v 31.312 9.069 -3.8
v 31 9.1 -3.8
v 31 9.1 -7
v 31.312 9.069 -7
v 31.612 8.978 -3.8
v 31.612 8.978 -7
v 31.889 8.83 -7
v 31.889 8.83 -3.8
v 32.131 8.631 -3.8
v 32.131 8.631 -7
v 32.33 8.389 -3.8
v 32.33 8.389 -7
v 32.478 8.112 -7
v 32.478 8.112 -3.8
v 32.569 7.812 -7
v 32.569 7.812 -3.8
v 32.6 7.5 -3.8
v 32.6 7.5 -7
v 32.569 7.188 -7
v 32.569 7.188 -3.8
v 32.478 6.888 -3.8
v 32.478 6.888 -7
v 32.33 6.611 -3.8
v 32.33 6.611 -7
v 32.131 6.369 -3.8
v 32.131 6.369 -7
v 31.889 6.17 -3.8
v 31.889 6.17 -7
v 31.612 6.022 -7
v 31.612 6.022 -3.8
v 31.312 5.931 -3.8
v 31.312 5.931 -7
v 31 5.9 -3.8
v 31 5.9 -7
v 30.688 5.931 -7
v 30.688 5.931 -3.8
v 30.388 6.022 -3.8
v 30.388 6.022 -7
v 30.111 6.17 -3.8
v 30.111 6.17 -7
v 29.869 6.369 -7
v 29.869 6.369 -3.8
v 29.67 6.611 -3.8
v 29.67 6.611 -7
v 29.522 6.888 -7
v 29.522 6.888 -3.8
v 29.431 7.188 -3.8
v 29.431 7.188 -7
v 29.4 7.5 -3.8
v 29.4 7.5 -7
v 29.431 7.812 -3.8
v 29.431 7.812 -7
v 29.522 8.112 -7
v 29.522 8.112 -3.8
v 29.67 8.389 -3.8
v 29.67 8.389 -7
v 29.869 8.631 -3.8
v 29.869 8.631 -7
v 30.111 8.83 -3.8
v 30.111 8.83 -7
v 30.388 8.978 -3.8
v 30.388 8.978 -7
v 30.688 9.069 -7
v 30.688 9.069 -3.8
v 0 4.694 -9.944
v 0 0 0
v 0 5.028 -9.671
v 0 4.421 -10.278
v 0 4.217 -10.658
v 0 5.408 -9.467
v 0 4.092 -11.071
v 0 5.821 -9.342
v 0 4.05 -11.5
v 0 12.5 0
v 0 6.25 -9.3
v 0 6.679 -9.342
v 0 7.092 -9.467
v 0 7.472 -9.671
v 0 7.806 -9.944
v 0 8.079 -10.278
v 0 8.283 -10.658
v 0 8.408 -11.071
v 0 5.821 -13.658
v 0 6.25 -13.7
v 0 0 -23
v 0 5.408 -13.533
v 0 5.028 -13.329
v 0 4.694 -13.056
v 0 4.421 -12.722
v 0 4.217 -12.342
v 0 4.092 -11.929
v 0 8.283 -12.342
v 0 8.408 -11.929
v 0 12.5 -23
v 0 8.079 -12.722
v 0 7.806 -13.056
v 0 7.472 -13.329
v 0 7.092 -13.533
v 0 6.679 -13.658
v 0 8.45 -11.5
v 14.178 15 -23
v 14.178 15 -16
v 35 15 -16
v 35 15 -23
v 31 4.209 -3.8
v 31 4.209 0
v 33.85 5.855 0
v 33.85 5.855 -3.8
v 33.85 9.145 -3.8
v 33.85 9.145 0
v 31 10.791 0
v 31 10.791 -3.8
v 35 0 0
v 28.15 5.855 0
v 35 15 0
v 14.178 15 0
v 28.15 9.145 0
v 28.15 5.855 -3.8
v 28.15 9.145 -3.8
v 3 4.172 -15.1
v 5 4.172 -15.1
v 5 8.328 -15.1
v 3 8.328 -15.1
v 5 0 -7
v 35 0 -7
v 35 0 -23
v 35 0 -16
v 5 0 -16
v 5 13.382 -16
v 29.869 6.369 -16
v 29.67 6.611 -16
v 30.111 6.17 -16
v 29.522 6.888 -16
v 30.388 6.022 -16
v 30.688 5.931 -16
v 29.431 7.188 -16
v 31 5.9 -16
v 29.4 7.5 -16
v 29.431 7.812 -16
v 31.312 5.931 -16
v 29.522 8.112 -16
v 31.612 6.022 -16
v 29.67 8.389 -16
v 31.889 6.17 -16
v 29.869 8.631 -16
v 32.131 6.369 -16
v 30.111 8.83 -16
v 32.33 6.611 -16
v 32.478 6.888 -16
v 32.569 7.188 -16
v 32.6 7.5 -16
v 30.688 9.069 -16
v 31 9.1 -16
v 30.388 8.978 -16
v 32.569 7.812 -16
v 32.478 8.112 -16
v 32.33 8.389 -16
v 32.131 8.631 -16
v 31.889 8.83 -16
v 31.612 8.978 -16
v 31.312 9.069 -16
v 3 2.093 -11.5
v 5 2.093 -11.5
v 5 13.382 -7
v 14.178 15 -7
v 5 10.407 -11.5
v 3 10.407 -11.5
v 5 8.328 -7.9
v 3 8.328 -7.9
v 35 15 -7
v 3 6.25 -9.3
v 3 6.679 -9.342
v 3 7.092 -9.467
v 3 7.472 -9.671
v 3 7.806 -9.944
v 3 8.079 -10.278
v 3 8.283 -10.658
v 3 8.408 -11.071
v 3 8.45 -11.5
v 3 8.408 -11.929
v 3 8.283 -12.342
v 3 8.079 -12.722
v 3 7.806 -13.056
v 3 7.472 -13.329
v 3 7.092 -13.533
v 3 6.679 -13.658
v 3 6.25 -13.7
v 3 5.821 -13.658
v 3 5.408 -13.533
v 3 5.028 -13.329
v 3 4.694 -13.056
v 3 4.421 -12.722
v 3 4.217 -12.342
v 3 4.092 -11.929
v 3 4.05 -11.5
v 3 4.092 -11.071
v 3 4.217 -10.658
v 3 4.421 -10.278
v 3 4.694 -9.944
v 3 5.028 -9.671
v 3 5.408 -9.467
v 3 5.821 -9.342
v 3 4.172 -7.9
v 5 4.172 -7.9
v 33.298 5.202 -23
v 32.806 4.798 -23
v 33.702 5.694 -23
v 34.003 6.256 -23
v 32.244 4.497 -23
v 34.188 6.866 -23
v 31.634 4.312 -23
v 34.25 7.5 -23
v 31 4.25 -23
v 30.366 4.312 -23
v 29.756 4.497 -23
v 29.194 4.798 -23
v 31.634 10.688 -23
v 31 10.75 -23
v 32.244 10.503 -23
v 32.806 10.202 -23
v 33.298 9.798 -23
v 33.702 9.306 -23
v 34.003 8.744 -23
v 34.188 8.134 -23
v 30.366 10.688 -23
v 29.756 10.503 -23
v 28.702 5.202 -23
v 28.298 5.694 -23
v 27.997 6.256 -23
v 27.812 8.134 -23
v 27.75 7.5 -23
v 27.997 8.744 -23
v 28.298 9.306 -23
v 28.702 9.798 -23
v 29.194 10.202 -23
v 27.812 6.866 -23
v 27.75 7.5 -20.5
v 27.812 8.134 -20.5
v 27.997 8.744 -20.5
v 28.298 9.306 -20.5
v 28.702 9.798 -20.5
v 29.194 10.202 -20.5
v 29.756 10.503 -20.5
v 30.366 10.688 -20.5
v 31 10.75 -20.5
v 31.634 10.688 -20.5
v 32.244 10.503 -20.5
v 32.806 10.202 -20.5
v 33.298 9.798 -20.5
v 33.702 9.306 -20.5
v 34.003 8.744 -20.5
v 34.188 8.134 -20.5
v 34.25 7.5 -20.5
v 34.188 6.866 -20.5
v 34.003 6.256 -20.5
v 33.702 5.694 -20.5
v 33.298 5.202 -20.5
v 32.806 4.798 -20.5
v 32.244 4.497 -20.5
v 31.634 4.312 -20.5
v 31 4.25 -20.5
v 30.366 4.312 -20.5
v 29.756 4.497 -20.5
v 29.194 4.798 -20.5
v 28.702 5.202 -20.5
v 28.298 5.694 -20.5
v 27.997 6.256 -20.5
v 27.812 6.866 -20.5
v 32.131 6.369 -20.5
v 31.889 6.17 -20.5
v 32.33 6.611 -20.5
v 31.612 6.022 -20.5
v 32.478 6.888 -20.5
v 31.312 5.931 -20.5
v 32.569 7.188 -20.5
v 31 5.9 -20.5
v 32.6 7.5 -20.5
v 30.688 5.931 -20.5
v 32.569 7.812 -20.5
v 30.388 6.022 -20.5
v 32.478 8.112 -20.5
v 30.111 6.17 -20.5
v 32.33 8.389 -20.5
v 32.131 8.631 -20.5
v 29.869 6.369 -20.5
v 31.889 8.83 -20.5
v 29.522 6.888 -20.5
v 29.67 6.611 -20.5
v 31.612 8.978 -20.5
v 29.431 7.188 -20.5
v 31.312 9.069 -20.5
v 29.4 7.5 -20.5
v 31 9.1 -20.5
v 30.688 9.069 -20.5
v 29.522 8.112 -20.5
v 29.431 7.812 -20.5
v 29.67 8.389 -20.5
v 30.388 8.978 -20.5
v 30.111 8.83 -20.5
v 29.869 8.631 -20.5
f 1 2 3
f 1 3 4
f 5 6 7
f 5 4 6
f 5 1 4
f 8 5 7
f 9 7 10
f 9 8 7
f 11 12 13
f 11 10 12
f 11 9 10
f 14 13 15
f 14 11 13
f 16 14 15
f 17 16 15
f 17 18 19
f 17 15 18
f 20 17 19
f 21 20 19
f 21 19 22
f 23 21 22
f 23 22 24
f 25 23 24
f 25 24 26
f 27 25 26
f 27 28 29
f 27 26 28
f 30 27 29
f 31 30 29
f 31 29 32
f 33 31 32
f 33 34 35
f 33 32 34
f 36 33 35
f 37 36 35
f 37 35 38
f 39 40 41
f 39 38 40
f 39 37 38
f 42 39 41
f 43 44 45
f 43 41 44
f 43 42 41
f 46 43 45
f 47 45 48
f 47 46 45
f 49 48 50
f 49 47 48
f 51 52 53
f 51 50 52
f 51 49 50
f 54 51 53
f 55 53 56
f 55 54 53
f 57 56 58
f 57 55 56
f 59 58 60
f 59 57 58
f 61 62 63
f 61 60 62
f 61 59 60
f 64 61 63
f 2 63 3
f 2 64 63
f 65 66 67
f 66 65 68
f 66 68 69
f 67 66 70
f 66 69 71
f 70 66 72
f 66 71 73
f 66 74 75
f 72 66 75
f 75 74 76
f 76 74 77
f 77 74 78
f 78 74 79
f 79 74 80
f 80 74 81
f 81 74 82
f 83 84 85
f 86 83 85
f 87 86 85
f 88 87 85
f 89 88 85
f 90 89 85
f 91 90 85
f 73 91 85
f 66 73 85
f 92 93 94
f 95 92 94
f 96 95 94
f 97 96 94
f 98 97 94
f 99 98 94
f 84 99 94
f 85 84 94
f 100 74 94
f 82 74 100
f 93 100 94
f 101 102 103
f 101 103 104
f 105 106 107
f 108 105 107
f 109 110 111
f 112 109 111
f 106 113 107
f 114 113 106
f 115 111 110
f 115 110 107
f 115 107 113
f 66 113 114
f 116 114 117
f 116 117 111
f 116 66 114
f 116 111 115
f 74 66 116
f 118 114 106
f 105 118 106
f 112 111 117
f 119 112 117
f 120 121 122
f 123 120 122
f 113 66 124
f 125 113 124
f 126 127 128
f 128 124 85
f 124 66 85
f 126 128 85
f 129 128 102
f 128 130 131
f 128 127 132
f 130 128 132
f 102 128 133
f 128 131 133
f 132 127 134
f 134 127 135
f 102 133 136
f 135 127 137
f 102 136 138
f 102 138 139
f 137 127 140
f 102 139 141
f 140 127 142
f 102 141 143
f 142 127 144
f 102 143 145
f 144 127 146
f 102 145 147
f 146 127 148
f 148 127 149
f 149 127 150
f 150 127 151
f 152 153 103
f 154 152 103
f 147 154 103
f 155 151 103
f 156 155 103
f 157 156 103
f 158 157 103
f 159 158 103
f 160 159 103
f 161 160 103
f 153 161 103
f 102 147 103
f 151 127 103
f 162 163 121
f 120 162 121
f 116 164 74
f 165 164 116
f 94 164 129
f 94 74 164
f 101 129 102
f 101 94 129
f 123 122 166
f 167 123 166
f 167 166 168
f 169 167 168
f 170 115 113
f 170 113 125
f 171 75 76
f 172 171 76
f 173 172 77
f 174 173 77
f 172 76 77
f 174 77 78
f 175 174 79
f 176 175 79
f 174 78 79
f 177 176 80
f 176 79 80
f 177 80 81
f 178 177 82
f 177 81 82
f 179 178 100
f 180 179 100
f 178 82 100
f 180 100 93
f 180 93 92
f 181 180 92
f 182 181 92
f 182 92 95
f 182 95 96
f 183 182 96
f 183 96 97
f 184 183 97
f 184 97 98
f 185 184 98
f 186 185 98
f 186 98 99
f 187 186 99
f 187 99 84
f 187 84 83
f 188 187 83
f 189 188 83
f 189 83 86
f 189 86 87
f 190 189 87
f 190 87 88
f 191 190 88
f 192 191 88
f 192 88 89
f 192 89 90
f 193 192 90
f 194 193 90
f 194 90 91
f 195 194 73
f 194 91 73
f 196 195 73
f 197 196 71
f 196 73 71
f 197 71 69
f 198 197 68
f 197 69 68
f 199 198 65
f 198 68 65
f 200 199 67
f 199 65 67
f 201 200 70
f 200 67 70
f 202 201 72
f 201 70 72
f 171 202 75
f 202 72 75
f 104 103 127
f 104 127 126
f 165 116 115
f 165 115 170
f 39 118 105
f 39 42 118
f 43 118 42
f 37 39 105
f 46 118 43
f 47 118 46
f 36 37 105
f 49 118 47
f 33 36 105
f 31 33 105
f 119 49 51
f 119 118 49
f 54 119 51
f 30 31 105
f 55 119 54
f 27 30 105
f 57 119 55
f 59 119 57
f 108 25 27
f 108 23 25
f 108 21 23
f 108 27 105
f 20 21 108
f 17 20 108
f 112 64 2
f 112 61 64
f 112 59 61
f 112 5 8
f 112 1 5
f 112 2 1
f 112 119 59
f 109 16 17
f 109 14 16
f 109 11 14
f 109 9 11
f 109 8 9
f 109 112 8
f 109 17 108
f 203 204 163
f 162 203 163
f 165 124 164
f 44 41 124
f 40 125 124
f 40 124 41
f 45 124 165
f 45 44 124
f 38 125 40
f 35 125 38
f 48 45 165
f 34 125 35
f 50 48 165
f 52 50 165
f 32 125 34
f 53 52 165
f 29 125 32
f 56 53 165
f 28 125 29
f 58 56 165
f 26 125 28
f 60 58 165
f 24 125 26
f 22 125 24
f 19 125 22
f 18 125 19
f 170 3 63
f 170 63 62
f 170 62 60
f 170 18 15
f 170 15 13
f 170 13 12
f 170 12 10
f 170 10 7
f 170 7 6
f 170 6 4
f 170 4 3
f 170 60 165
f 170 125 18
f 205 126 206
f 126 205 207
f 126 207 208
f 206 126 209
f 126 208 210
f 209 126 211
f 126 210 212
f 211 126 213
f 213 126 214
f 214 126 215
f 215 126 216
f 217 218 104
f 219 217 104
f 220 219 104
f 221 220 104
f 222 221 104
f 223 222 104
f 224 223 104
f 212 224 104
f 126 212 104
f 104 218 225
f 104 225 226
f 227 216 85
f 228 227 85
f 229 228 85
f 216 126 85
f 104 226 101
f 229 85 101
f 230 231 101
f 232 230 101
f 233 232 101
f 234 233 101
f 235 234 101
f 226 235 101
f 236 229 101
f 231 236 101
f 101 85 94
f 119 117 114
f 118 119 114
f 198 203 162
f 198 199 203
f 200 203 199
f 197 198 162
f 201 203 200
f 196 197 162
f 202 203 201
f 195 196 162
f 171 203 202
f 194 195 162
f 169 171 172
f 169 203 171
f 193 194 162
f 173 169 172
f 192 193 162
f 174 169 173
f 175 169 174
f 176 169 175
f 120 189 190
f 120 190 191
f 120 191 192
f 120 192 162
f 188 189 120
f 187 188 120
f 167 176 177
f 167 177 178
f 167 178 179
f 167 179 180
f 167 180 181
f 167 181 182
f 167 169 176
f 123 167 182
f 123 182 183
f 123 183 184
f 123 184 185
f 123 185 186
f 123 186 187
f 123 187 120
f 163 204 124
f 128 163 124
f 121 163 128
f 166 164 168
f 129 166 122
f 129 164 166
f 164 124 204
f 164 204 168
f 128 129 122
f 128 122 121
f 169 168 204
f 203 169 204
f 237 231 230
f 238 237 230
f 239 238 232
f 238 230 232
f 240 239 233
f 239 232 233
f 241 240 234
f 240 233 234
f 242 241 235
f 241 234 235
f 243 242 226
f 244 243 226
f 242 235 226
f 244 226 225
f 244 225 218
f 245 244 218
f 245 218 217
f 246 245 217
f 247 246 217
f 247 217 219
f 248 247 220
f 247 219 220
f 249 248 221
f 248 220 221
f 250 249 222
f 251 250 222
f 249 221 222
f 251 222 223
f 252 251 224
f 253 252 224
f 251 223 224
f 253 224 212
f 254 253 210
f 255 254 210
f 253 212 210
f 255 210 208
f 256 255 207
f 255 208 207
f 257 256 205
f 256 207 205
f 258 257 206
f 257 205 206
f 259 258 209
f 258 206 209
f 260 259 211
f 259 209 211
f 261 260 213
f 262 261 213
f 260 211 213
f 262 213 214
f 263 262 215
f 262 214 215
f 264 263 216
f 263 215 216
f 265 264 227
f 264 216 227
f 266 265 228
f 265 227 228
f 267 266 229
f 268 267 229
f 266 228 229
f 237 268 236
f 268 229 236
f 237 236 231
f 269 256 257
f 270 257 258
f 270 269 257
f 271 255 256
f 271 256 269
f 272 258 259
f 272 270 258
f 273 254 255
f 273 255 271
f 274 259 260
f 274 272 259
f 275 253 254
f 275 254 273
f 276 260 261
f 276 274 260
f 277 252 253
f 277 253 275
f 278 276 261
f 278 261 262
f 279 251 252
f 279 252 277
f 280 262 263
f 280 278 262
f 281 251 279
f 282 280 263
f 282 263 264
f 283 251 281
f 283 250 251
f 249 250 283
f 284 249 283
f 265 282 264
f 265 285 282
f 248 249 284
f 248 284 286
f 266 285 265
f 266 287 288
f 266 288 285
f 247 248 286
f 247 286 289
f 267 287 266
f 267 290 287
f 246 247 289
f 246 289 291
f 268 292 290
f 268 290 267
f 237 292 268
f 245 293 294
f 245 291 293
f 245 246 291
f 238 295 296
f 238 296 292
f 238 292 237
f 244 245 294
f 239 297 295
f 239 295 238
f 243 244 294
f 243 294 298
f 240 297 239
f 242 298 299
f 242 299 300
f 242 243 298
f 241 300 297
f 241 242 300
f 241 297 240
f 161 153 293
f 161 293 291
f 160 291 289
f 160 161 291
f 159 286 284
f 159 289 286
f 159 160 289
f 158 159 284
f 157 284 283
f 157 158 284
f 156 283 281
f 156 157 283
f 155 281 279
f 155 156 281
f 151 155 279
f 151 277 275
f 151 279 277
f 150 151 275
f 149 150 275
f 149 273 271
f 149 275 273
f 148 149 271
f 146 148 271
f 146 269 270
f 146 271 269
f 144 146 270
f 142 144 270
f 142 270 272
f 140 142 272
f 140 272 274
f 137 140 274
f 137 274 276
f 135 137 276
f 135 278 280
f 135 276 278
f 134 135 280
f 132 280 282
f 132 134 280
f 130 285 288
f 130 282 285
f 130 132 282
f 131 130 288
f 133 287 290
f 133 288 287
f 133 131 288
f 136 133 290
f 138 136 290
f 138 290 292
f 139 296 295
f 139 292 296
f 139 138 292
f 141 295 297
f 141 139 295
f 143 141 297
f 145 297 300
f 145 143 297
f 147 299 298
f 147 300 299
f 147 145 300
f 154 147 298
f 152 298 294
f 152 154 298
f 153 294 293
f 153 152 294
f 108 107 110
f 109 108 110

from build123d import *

# Parameters (mm, degrees)
SKETCH1_W               = 23
SKETCH1_H               = 15
BOSS_EXTRUDE1_DEPTH     = 35
SKETCH2_W               = 9
SKETCH2_H               = 15
CUT_EXTRUDE1_DEPTH      = 30
CUT_EXTRUDE2_DEPTH      = 45.485952839
CUT_EXTRUDE2_DEPTH_BACK = 45.485952839
SKETCH3_R               = 1.6
CHAMFER1_SIZE           = 2.5
CHAMFER1_SIZE_2         = 14.178204549
SKETCH4_R               = 2.2
CUT_EXTRUDE3_DEPTH      = 10
CUT_EXTRUDE4_DEPTH      = 2
SKETCH6_R               = 3.25
CUT_EXTRUDE5_DEPTH      = 2.5
CUT_EXTRUDE6_DEPTH      = 3.8


with BuildPart() as part:
    # Sketch1 → Boss-Extrude1 (new body)
    with BuildSketch(Plane(origin=(0, 0, 0), x_dir=(0, 0, -1), z_dir=(1, 0, 0))):
        with Locations((11.5, 7.5)):
            Rectangle(SKETCH1_W, SKETCH1_H)
    extrude(amount=BOSS_EXTRUDE1_DEPTH)

    # Sketch2 → Cut-Extrude1 (cut)
    with BuildSketch(Plane(origin=(35, 0, 0), x_dir=(0, 0, -1), z_dir=(1, 0, 0))):
        with Locations((11.5, 7.5)):
            Rectangle(SKETCH2_W, SKETCH2_H)
    extrude(amount=-CUT_EXTRUDE1_DEPTH, mode=Mode.SUBTRACT)

    # Sketch3 → Cut-Extrude2 (cut, two sides: drawn at the far end of the back side and taken through both)
    with BuildSketch(Plane(origin=(0, 0, -23), x_dir=(-1, 0, 0), z_dir=(0, 0, -1)).offset(-CUT_EXTRUDE2_DEPTH_BACK)):
        with Locations(Location((-31, 7.5, 0), (0, 0, 90))):
            Circle(SKETCH3_R)
    extrude(amount=CUT_EXTRUDE2_DEPTH + CUT_EXTRUDE2_DEPTH_BACK, mode=Mode.SUBTRACT)

    # Chamfer1
    # the kernel refuses this chamfer: 14.178204549, 2.5 mm, written as the material it takes off along each edge
    with BuildSketch(Plane(origin=(0, 15, -59.842614584), x_dir=(-0.21013876076743537, -0.9776715712462578, 0), z_dir=(0, 0, 1))) as chamfer1_piece_1:
        Polygon((CHAMFER1_SIZE * 0.977671571246, CHAMFER1_SIZE * 0.210138760767), (-CHAMFER1_SIZE_2 * 0.210138760768, CHAMFER1_SIZE_2 * 0.977671571249), (0, 0), align=None)
    extrude(amount=96.685229169, mode=Mode.SUBTRACT)

    # Sketch4 → Cut-Extrude3 (cut)
    with BuildSketch(Plane.ZY):
        with Locations((-11.5, 6.25)):
            Circle(SKETCH4_R)
    extrude(amount=-CUT_EXTRUDE3_DEPTH, mode=Mode.SUBTRACT)

    # Sketch5 → Cut-Extrude4 (cut)
    with BuildSketch(Plane(origin=(5, 0, 0), x_dir=(0, 0, -1), z_dir=(1, 0, 0))):
        Polygon((7.9, 8.328460969), (7.9, 4.171539031), (11.5, 2.093078062), (15.1, 4.171539031), (15.1, 8.328460969), (11.5, 10.406921938), align=None)
    extrude(amount=-CUT_EXTRUDE4_DEPTH, mode=Mode.SUBTRACT)

    # Sketch6 → Cut-Extrude5 (cut)
    with BuildSketch(Plane(origin=(0, 0, -23), x_dir=(-1, 0, 0), z_dir=(0, 0, -1))):
        with Locations((-31, 7.5)):
            Circle(SKETCH6_R)
    extrude(amount=-CUT_EXTRUDE5_DEPTH, mode=Mode.SUBTRACT)

    # Sketch7 → Cut-Extrude6 (cut)
    with BuildSketch(Plane.XY):
        Polygon((28.15, 9.145448267), (28.15, 5.854551733), (31, 4.209103466), (33.85, 5.854551733), (33.85, 9.145448267), (31, 10.790896534), align=None)
    extrude(amount=-CUT_EXTRUDE6_DEPTH, mode=Mode.SUBTRACT)


solid = part.part
